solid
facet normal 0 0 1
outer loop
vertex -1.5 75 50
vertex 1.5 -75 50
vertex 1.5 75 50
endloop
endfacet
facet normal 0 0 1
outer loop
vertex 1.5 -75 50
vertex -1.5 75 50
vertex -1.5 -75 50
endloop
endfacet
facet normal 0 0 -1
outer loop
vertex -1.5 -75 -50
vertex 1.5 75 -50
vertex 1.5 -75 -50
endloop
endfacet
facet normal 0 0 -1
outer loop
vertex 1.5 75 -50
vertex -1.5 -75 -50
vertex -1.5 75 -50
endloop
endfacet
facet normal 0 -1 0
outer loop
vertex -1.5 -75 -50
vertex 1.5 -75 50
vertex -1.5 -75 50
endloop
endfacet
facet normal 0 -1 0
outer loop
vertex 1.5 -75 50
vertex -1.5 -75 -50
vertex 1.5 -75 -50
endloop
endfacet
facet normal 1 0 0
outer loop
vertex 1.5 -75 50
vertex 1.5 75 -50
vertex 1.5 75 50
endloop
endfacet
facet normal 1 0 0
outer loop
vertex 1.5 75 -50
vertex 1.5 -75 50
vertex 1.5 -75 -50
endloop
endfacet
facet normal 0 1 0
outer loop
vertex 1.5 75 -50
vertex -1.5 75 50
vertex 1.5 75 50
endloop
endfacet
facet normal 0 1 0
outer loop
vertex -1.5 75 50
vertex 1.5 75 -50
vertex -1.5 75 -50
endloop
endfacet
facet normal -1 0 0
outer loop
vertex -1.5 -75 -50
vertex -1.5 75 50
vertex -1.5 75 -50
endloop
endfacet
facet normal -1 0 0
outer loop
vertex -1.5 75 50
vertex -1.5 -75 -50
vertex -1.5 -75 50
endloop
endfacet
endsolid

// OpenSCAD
// file: config.scad
// all measures in millimeters

material_z = 3;

slice_count = 5;
hotel_x = material_z * slice_count;
hotel_y = 150;
hotel_z = 100;
// main file
include <config.scad>;

module backside()
{
    cube([
        material_z,
        hotel_y,
        hotel_z
        ], center=true);
}

backside();
